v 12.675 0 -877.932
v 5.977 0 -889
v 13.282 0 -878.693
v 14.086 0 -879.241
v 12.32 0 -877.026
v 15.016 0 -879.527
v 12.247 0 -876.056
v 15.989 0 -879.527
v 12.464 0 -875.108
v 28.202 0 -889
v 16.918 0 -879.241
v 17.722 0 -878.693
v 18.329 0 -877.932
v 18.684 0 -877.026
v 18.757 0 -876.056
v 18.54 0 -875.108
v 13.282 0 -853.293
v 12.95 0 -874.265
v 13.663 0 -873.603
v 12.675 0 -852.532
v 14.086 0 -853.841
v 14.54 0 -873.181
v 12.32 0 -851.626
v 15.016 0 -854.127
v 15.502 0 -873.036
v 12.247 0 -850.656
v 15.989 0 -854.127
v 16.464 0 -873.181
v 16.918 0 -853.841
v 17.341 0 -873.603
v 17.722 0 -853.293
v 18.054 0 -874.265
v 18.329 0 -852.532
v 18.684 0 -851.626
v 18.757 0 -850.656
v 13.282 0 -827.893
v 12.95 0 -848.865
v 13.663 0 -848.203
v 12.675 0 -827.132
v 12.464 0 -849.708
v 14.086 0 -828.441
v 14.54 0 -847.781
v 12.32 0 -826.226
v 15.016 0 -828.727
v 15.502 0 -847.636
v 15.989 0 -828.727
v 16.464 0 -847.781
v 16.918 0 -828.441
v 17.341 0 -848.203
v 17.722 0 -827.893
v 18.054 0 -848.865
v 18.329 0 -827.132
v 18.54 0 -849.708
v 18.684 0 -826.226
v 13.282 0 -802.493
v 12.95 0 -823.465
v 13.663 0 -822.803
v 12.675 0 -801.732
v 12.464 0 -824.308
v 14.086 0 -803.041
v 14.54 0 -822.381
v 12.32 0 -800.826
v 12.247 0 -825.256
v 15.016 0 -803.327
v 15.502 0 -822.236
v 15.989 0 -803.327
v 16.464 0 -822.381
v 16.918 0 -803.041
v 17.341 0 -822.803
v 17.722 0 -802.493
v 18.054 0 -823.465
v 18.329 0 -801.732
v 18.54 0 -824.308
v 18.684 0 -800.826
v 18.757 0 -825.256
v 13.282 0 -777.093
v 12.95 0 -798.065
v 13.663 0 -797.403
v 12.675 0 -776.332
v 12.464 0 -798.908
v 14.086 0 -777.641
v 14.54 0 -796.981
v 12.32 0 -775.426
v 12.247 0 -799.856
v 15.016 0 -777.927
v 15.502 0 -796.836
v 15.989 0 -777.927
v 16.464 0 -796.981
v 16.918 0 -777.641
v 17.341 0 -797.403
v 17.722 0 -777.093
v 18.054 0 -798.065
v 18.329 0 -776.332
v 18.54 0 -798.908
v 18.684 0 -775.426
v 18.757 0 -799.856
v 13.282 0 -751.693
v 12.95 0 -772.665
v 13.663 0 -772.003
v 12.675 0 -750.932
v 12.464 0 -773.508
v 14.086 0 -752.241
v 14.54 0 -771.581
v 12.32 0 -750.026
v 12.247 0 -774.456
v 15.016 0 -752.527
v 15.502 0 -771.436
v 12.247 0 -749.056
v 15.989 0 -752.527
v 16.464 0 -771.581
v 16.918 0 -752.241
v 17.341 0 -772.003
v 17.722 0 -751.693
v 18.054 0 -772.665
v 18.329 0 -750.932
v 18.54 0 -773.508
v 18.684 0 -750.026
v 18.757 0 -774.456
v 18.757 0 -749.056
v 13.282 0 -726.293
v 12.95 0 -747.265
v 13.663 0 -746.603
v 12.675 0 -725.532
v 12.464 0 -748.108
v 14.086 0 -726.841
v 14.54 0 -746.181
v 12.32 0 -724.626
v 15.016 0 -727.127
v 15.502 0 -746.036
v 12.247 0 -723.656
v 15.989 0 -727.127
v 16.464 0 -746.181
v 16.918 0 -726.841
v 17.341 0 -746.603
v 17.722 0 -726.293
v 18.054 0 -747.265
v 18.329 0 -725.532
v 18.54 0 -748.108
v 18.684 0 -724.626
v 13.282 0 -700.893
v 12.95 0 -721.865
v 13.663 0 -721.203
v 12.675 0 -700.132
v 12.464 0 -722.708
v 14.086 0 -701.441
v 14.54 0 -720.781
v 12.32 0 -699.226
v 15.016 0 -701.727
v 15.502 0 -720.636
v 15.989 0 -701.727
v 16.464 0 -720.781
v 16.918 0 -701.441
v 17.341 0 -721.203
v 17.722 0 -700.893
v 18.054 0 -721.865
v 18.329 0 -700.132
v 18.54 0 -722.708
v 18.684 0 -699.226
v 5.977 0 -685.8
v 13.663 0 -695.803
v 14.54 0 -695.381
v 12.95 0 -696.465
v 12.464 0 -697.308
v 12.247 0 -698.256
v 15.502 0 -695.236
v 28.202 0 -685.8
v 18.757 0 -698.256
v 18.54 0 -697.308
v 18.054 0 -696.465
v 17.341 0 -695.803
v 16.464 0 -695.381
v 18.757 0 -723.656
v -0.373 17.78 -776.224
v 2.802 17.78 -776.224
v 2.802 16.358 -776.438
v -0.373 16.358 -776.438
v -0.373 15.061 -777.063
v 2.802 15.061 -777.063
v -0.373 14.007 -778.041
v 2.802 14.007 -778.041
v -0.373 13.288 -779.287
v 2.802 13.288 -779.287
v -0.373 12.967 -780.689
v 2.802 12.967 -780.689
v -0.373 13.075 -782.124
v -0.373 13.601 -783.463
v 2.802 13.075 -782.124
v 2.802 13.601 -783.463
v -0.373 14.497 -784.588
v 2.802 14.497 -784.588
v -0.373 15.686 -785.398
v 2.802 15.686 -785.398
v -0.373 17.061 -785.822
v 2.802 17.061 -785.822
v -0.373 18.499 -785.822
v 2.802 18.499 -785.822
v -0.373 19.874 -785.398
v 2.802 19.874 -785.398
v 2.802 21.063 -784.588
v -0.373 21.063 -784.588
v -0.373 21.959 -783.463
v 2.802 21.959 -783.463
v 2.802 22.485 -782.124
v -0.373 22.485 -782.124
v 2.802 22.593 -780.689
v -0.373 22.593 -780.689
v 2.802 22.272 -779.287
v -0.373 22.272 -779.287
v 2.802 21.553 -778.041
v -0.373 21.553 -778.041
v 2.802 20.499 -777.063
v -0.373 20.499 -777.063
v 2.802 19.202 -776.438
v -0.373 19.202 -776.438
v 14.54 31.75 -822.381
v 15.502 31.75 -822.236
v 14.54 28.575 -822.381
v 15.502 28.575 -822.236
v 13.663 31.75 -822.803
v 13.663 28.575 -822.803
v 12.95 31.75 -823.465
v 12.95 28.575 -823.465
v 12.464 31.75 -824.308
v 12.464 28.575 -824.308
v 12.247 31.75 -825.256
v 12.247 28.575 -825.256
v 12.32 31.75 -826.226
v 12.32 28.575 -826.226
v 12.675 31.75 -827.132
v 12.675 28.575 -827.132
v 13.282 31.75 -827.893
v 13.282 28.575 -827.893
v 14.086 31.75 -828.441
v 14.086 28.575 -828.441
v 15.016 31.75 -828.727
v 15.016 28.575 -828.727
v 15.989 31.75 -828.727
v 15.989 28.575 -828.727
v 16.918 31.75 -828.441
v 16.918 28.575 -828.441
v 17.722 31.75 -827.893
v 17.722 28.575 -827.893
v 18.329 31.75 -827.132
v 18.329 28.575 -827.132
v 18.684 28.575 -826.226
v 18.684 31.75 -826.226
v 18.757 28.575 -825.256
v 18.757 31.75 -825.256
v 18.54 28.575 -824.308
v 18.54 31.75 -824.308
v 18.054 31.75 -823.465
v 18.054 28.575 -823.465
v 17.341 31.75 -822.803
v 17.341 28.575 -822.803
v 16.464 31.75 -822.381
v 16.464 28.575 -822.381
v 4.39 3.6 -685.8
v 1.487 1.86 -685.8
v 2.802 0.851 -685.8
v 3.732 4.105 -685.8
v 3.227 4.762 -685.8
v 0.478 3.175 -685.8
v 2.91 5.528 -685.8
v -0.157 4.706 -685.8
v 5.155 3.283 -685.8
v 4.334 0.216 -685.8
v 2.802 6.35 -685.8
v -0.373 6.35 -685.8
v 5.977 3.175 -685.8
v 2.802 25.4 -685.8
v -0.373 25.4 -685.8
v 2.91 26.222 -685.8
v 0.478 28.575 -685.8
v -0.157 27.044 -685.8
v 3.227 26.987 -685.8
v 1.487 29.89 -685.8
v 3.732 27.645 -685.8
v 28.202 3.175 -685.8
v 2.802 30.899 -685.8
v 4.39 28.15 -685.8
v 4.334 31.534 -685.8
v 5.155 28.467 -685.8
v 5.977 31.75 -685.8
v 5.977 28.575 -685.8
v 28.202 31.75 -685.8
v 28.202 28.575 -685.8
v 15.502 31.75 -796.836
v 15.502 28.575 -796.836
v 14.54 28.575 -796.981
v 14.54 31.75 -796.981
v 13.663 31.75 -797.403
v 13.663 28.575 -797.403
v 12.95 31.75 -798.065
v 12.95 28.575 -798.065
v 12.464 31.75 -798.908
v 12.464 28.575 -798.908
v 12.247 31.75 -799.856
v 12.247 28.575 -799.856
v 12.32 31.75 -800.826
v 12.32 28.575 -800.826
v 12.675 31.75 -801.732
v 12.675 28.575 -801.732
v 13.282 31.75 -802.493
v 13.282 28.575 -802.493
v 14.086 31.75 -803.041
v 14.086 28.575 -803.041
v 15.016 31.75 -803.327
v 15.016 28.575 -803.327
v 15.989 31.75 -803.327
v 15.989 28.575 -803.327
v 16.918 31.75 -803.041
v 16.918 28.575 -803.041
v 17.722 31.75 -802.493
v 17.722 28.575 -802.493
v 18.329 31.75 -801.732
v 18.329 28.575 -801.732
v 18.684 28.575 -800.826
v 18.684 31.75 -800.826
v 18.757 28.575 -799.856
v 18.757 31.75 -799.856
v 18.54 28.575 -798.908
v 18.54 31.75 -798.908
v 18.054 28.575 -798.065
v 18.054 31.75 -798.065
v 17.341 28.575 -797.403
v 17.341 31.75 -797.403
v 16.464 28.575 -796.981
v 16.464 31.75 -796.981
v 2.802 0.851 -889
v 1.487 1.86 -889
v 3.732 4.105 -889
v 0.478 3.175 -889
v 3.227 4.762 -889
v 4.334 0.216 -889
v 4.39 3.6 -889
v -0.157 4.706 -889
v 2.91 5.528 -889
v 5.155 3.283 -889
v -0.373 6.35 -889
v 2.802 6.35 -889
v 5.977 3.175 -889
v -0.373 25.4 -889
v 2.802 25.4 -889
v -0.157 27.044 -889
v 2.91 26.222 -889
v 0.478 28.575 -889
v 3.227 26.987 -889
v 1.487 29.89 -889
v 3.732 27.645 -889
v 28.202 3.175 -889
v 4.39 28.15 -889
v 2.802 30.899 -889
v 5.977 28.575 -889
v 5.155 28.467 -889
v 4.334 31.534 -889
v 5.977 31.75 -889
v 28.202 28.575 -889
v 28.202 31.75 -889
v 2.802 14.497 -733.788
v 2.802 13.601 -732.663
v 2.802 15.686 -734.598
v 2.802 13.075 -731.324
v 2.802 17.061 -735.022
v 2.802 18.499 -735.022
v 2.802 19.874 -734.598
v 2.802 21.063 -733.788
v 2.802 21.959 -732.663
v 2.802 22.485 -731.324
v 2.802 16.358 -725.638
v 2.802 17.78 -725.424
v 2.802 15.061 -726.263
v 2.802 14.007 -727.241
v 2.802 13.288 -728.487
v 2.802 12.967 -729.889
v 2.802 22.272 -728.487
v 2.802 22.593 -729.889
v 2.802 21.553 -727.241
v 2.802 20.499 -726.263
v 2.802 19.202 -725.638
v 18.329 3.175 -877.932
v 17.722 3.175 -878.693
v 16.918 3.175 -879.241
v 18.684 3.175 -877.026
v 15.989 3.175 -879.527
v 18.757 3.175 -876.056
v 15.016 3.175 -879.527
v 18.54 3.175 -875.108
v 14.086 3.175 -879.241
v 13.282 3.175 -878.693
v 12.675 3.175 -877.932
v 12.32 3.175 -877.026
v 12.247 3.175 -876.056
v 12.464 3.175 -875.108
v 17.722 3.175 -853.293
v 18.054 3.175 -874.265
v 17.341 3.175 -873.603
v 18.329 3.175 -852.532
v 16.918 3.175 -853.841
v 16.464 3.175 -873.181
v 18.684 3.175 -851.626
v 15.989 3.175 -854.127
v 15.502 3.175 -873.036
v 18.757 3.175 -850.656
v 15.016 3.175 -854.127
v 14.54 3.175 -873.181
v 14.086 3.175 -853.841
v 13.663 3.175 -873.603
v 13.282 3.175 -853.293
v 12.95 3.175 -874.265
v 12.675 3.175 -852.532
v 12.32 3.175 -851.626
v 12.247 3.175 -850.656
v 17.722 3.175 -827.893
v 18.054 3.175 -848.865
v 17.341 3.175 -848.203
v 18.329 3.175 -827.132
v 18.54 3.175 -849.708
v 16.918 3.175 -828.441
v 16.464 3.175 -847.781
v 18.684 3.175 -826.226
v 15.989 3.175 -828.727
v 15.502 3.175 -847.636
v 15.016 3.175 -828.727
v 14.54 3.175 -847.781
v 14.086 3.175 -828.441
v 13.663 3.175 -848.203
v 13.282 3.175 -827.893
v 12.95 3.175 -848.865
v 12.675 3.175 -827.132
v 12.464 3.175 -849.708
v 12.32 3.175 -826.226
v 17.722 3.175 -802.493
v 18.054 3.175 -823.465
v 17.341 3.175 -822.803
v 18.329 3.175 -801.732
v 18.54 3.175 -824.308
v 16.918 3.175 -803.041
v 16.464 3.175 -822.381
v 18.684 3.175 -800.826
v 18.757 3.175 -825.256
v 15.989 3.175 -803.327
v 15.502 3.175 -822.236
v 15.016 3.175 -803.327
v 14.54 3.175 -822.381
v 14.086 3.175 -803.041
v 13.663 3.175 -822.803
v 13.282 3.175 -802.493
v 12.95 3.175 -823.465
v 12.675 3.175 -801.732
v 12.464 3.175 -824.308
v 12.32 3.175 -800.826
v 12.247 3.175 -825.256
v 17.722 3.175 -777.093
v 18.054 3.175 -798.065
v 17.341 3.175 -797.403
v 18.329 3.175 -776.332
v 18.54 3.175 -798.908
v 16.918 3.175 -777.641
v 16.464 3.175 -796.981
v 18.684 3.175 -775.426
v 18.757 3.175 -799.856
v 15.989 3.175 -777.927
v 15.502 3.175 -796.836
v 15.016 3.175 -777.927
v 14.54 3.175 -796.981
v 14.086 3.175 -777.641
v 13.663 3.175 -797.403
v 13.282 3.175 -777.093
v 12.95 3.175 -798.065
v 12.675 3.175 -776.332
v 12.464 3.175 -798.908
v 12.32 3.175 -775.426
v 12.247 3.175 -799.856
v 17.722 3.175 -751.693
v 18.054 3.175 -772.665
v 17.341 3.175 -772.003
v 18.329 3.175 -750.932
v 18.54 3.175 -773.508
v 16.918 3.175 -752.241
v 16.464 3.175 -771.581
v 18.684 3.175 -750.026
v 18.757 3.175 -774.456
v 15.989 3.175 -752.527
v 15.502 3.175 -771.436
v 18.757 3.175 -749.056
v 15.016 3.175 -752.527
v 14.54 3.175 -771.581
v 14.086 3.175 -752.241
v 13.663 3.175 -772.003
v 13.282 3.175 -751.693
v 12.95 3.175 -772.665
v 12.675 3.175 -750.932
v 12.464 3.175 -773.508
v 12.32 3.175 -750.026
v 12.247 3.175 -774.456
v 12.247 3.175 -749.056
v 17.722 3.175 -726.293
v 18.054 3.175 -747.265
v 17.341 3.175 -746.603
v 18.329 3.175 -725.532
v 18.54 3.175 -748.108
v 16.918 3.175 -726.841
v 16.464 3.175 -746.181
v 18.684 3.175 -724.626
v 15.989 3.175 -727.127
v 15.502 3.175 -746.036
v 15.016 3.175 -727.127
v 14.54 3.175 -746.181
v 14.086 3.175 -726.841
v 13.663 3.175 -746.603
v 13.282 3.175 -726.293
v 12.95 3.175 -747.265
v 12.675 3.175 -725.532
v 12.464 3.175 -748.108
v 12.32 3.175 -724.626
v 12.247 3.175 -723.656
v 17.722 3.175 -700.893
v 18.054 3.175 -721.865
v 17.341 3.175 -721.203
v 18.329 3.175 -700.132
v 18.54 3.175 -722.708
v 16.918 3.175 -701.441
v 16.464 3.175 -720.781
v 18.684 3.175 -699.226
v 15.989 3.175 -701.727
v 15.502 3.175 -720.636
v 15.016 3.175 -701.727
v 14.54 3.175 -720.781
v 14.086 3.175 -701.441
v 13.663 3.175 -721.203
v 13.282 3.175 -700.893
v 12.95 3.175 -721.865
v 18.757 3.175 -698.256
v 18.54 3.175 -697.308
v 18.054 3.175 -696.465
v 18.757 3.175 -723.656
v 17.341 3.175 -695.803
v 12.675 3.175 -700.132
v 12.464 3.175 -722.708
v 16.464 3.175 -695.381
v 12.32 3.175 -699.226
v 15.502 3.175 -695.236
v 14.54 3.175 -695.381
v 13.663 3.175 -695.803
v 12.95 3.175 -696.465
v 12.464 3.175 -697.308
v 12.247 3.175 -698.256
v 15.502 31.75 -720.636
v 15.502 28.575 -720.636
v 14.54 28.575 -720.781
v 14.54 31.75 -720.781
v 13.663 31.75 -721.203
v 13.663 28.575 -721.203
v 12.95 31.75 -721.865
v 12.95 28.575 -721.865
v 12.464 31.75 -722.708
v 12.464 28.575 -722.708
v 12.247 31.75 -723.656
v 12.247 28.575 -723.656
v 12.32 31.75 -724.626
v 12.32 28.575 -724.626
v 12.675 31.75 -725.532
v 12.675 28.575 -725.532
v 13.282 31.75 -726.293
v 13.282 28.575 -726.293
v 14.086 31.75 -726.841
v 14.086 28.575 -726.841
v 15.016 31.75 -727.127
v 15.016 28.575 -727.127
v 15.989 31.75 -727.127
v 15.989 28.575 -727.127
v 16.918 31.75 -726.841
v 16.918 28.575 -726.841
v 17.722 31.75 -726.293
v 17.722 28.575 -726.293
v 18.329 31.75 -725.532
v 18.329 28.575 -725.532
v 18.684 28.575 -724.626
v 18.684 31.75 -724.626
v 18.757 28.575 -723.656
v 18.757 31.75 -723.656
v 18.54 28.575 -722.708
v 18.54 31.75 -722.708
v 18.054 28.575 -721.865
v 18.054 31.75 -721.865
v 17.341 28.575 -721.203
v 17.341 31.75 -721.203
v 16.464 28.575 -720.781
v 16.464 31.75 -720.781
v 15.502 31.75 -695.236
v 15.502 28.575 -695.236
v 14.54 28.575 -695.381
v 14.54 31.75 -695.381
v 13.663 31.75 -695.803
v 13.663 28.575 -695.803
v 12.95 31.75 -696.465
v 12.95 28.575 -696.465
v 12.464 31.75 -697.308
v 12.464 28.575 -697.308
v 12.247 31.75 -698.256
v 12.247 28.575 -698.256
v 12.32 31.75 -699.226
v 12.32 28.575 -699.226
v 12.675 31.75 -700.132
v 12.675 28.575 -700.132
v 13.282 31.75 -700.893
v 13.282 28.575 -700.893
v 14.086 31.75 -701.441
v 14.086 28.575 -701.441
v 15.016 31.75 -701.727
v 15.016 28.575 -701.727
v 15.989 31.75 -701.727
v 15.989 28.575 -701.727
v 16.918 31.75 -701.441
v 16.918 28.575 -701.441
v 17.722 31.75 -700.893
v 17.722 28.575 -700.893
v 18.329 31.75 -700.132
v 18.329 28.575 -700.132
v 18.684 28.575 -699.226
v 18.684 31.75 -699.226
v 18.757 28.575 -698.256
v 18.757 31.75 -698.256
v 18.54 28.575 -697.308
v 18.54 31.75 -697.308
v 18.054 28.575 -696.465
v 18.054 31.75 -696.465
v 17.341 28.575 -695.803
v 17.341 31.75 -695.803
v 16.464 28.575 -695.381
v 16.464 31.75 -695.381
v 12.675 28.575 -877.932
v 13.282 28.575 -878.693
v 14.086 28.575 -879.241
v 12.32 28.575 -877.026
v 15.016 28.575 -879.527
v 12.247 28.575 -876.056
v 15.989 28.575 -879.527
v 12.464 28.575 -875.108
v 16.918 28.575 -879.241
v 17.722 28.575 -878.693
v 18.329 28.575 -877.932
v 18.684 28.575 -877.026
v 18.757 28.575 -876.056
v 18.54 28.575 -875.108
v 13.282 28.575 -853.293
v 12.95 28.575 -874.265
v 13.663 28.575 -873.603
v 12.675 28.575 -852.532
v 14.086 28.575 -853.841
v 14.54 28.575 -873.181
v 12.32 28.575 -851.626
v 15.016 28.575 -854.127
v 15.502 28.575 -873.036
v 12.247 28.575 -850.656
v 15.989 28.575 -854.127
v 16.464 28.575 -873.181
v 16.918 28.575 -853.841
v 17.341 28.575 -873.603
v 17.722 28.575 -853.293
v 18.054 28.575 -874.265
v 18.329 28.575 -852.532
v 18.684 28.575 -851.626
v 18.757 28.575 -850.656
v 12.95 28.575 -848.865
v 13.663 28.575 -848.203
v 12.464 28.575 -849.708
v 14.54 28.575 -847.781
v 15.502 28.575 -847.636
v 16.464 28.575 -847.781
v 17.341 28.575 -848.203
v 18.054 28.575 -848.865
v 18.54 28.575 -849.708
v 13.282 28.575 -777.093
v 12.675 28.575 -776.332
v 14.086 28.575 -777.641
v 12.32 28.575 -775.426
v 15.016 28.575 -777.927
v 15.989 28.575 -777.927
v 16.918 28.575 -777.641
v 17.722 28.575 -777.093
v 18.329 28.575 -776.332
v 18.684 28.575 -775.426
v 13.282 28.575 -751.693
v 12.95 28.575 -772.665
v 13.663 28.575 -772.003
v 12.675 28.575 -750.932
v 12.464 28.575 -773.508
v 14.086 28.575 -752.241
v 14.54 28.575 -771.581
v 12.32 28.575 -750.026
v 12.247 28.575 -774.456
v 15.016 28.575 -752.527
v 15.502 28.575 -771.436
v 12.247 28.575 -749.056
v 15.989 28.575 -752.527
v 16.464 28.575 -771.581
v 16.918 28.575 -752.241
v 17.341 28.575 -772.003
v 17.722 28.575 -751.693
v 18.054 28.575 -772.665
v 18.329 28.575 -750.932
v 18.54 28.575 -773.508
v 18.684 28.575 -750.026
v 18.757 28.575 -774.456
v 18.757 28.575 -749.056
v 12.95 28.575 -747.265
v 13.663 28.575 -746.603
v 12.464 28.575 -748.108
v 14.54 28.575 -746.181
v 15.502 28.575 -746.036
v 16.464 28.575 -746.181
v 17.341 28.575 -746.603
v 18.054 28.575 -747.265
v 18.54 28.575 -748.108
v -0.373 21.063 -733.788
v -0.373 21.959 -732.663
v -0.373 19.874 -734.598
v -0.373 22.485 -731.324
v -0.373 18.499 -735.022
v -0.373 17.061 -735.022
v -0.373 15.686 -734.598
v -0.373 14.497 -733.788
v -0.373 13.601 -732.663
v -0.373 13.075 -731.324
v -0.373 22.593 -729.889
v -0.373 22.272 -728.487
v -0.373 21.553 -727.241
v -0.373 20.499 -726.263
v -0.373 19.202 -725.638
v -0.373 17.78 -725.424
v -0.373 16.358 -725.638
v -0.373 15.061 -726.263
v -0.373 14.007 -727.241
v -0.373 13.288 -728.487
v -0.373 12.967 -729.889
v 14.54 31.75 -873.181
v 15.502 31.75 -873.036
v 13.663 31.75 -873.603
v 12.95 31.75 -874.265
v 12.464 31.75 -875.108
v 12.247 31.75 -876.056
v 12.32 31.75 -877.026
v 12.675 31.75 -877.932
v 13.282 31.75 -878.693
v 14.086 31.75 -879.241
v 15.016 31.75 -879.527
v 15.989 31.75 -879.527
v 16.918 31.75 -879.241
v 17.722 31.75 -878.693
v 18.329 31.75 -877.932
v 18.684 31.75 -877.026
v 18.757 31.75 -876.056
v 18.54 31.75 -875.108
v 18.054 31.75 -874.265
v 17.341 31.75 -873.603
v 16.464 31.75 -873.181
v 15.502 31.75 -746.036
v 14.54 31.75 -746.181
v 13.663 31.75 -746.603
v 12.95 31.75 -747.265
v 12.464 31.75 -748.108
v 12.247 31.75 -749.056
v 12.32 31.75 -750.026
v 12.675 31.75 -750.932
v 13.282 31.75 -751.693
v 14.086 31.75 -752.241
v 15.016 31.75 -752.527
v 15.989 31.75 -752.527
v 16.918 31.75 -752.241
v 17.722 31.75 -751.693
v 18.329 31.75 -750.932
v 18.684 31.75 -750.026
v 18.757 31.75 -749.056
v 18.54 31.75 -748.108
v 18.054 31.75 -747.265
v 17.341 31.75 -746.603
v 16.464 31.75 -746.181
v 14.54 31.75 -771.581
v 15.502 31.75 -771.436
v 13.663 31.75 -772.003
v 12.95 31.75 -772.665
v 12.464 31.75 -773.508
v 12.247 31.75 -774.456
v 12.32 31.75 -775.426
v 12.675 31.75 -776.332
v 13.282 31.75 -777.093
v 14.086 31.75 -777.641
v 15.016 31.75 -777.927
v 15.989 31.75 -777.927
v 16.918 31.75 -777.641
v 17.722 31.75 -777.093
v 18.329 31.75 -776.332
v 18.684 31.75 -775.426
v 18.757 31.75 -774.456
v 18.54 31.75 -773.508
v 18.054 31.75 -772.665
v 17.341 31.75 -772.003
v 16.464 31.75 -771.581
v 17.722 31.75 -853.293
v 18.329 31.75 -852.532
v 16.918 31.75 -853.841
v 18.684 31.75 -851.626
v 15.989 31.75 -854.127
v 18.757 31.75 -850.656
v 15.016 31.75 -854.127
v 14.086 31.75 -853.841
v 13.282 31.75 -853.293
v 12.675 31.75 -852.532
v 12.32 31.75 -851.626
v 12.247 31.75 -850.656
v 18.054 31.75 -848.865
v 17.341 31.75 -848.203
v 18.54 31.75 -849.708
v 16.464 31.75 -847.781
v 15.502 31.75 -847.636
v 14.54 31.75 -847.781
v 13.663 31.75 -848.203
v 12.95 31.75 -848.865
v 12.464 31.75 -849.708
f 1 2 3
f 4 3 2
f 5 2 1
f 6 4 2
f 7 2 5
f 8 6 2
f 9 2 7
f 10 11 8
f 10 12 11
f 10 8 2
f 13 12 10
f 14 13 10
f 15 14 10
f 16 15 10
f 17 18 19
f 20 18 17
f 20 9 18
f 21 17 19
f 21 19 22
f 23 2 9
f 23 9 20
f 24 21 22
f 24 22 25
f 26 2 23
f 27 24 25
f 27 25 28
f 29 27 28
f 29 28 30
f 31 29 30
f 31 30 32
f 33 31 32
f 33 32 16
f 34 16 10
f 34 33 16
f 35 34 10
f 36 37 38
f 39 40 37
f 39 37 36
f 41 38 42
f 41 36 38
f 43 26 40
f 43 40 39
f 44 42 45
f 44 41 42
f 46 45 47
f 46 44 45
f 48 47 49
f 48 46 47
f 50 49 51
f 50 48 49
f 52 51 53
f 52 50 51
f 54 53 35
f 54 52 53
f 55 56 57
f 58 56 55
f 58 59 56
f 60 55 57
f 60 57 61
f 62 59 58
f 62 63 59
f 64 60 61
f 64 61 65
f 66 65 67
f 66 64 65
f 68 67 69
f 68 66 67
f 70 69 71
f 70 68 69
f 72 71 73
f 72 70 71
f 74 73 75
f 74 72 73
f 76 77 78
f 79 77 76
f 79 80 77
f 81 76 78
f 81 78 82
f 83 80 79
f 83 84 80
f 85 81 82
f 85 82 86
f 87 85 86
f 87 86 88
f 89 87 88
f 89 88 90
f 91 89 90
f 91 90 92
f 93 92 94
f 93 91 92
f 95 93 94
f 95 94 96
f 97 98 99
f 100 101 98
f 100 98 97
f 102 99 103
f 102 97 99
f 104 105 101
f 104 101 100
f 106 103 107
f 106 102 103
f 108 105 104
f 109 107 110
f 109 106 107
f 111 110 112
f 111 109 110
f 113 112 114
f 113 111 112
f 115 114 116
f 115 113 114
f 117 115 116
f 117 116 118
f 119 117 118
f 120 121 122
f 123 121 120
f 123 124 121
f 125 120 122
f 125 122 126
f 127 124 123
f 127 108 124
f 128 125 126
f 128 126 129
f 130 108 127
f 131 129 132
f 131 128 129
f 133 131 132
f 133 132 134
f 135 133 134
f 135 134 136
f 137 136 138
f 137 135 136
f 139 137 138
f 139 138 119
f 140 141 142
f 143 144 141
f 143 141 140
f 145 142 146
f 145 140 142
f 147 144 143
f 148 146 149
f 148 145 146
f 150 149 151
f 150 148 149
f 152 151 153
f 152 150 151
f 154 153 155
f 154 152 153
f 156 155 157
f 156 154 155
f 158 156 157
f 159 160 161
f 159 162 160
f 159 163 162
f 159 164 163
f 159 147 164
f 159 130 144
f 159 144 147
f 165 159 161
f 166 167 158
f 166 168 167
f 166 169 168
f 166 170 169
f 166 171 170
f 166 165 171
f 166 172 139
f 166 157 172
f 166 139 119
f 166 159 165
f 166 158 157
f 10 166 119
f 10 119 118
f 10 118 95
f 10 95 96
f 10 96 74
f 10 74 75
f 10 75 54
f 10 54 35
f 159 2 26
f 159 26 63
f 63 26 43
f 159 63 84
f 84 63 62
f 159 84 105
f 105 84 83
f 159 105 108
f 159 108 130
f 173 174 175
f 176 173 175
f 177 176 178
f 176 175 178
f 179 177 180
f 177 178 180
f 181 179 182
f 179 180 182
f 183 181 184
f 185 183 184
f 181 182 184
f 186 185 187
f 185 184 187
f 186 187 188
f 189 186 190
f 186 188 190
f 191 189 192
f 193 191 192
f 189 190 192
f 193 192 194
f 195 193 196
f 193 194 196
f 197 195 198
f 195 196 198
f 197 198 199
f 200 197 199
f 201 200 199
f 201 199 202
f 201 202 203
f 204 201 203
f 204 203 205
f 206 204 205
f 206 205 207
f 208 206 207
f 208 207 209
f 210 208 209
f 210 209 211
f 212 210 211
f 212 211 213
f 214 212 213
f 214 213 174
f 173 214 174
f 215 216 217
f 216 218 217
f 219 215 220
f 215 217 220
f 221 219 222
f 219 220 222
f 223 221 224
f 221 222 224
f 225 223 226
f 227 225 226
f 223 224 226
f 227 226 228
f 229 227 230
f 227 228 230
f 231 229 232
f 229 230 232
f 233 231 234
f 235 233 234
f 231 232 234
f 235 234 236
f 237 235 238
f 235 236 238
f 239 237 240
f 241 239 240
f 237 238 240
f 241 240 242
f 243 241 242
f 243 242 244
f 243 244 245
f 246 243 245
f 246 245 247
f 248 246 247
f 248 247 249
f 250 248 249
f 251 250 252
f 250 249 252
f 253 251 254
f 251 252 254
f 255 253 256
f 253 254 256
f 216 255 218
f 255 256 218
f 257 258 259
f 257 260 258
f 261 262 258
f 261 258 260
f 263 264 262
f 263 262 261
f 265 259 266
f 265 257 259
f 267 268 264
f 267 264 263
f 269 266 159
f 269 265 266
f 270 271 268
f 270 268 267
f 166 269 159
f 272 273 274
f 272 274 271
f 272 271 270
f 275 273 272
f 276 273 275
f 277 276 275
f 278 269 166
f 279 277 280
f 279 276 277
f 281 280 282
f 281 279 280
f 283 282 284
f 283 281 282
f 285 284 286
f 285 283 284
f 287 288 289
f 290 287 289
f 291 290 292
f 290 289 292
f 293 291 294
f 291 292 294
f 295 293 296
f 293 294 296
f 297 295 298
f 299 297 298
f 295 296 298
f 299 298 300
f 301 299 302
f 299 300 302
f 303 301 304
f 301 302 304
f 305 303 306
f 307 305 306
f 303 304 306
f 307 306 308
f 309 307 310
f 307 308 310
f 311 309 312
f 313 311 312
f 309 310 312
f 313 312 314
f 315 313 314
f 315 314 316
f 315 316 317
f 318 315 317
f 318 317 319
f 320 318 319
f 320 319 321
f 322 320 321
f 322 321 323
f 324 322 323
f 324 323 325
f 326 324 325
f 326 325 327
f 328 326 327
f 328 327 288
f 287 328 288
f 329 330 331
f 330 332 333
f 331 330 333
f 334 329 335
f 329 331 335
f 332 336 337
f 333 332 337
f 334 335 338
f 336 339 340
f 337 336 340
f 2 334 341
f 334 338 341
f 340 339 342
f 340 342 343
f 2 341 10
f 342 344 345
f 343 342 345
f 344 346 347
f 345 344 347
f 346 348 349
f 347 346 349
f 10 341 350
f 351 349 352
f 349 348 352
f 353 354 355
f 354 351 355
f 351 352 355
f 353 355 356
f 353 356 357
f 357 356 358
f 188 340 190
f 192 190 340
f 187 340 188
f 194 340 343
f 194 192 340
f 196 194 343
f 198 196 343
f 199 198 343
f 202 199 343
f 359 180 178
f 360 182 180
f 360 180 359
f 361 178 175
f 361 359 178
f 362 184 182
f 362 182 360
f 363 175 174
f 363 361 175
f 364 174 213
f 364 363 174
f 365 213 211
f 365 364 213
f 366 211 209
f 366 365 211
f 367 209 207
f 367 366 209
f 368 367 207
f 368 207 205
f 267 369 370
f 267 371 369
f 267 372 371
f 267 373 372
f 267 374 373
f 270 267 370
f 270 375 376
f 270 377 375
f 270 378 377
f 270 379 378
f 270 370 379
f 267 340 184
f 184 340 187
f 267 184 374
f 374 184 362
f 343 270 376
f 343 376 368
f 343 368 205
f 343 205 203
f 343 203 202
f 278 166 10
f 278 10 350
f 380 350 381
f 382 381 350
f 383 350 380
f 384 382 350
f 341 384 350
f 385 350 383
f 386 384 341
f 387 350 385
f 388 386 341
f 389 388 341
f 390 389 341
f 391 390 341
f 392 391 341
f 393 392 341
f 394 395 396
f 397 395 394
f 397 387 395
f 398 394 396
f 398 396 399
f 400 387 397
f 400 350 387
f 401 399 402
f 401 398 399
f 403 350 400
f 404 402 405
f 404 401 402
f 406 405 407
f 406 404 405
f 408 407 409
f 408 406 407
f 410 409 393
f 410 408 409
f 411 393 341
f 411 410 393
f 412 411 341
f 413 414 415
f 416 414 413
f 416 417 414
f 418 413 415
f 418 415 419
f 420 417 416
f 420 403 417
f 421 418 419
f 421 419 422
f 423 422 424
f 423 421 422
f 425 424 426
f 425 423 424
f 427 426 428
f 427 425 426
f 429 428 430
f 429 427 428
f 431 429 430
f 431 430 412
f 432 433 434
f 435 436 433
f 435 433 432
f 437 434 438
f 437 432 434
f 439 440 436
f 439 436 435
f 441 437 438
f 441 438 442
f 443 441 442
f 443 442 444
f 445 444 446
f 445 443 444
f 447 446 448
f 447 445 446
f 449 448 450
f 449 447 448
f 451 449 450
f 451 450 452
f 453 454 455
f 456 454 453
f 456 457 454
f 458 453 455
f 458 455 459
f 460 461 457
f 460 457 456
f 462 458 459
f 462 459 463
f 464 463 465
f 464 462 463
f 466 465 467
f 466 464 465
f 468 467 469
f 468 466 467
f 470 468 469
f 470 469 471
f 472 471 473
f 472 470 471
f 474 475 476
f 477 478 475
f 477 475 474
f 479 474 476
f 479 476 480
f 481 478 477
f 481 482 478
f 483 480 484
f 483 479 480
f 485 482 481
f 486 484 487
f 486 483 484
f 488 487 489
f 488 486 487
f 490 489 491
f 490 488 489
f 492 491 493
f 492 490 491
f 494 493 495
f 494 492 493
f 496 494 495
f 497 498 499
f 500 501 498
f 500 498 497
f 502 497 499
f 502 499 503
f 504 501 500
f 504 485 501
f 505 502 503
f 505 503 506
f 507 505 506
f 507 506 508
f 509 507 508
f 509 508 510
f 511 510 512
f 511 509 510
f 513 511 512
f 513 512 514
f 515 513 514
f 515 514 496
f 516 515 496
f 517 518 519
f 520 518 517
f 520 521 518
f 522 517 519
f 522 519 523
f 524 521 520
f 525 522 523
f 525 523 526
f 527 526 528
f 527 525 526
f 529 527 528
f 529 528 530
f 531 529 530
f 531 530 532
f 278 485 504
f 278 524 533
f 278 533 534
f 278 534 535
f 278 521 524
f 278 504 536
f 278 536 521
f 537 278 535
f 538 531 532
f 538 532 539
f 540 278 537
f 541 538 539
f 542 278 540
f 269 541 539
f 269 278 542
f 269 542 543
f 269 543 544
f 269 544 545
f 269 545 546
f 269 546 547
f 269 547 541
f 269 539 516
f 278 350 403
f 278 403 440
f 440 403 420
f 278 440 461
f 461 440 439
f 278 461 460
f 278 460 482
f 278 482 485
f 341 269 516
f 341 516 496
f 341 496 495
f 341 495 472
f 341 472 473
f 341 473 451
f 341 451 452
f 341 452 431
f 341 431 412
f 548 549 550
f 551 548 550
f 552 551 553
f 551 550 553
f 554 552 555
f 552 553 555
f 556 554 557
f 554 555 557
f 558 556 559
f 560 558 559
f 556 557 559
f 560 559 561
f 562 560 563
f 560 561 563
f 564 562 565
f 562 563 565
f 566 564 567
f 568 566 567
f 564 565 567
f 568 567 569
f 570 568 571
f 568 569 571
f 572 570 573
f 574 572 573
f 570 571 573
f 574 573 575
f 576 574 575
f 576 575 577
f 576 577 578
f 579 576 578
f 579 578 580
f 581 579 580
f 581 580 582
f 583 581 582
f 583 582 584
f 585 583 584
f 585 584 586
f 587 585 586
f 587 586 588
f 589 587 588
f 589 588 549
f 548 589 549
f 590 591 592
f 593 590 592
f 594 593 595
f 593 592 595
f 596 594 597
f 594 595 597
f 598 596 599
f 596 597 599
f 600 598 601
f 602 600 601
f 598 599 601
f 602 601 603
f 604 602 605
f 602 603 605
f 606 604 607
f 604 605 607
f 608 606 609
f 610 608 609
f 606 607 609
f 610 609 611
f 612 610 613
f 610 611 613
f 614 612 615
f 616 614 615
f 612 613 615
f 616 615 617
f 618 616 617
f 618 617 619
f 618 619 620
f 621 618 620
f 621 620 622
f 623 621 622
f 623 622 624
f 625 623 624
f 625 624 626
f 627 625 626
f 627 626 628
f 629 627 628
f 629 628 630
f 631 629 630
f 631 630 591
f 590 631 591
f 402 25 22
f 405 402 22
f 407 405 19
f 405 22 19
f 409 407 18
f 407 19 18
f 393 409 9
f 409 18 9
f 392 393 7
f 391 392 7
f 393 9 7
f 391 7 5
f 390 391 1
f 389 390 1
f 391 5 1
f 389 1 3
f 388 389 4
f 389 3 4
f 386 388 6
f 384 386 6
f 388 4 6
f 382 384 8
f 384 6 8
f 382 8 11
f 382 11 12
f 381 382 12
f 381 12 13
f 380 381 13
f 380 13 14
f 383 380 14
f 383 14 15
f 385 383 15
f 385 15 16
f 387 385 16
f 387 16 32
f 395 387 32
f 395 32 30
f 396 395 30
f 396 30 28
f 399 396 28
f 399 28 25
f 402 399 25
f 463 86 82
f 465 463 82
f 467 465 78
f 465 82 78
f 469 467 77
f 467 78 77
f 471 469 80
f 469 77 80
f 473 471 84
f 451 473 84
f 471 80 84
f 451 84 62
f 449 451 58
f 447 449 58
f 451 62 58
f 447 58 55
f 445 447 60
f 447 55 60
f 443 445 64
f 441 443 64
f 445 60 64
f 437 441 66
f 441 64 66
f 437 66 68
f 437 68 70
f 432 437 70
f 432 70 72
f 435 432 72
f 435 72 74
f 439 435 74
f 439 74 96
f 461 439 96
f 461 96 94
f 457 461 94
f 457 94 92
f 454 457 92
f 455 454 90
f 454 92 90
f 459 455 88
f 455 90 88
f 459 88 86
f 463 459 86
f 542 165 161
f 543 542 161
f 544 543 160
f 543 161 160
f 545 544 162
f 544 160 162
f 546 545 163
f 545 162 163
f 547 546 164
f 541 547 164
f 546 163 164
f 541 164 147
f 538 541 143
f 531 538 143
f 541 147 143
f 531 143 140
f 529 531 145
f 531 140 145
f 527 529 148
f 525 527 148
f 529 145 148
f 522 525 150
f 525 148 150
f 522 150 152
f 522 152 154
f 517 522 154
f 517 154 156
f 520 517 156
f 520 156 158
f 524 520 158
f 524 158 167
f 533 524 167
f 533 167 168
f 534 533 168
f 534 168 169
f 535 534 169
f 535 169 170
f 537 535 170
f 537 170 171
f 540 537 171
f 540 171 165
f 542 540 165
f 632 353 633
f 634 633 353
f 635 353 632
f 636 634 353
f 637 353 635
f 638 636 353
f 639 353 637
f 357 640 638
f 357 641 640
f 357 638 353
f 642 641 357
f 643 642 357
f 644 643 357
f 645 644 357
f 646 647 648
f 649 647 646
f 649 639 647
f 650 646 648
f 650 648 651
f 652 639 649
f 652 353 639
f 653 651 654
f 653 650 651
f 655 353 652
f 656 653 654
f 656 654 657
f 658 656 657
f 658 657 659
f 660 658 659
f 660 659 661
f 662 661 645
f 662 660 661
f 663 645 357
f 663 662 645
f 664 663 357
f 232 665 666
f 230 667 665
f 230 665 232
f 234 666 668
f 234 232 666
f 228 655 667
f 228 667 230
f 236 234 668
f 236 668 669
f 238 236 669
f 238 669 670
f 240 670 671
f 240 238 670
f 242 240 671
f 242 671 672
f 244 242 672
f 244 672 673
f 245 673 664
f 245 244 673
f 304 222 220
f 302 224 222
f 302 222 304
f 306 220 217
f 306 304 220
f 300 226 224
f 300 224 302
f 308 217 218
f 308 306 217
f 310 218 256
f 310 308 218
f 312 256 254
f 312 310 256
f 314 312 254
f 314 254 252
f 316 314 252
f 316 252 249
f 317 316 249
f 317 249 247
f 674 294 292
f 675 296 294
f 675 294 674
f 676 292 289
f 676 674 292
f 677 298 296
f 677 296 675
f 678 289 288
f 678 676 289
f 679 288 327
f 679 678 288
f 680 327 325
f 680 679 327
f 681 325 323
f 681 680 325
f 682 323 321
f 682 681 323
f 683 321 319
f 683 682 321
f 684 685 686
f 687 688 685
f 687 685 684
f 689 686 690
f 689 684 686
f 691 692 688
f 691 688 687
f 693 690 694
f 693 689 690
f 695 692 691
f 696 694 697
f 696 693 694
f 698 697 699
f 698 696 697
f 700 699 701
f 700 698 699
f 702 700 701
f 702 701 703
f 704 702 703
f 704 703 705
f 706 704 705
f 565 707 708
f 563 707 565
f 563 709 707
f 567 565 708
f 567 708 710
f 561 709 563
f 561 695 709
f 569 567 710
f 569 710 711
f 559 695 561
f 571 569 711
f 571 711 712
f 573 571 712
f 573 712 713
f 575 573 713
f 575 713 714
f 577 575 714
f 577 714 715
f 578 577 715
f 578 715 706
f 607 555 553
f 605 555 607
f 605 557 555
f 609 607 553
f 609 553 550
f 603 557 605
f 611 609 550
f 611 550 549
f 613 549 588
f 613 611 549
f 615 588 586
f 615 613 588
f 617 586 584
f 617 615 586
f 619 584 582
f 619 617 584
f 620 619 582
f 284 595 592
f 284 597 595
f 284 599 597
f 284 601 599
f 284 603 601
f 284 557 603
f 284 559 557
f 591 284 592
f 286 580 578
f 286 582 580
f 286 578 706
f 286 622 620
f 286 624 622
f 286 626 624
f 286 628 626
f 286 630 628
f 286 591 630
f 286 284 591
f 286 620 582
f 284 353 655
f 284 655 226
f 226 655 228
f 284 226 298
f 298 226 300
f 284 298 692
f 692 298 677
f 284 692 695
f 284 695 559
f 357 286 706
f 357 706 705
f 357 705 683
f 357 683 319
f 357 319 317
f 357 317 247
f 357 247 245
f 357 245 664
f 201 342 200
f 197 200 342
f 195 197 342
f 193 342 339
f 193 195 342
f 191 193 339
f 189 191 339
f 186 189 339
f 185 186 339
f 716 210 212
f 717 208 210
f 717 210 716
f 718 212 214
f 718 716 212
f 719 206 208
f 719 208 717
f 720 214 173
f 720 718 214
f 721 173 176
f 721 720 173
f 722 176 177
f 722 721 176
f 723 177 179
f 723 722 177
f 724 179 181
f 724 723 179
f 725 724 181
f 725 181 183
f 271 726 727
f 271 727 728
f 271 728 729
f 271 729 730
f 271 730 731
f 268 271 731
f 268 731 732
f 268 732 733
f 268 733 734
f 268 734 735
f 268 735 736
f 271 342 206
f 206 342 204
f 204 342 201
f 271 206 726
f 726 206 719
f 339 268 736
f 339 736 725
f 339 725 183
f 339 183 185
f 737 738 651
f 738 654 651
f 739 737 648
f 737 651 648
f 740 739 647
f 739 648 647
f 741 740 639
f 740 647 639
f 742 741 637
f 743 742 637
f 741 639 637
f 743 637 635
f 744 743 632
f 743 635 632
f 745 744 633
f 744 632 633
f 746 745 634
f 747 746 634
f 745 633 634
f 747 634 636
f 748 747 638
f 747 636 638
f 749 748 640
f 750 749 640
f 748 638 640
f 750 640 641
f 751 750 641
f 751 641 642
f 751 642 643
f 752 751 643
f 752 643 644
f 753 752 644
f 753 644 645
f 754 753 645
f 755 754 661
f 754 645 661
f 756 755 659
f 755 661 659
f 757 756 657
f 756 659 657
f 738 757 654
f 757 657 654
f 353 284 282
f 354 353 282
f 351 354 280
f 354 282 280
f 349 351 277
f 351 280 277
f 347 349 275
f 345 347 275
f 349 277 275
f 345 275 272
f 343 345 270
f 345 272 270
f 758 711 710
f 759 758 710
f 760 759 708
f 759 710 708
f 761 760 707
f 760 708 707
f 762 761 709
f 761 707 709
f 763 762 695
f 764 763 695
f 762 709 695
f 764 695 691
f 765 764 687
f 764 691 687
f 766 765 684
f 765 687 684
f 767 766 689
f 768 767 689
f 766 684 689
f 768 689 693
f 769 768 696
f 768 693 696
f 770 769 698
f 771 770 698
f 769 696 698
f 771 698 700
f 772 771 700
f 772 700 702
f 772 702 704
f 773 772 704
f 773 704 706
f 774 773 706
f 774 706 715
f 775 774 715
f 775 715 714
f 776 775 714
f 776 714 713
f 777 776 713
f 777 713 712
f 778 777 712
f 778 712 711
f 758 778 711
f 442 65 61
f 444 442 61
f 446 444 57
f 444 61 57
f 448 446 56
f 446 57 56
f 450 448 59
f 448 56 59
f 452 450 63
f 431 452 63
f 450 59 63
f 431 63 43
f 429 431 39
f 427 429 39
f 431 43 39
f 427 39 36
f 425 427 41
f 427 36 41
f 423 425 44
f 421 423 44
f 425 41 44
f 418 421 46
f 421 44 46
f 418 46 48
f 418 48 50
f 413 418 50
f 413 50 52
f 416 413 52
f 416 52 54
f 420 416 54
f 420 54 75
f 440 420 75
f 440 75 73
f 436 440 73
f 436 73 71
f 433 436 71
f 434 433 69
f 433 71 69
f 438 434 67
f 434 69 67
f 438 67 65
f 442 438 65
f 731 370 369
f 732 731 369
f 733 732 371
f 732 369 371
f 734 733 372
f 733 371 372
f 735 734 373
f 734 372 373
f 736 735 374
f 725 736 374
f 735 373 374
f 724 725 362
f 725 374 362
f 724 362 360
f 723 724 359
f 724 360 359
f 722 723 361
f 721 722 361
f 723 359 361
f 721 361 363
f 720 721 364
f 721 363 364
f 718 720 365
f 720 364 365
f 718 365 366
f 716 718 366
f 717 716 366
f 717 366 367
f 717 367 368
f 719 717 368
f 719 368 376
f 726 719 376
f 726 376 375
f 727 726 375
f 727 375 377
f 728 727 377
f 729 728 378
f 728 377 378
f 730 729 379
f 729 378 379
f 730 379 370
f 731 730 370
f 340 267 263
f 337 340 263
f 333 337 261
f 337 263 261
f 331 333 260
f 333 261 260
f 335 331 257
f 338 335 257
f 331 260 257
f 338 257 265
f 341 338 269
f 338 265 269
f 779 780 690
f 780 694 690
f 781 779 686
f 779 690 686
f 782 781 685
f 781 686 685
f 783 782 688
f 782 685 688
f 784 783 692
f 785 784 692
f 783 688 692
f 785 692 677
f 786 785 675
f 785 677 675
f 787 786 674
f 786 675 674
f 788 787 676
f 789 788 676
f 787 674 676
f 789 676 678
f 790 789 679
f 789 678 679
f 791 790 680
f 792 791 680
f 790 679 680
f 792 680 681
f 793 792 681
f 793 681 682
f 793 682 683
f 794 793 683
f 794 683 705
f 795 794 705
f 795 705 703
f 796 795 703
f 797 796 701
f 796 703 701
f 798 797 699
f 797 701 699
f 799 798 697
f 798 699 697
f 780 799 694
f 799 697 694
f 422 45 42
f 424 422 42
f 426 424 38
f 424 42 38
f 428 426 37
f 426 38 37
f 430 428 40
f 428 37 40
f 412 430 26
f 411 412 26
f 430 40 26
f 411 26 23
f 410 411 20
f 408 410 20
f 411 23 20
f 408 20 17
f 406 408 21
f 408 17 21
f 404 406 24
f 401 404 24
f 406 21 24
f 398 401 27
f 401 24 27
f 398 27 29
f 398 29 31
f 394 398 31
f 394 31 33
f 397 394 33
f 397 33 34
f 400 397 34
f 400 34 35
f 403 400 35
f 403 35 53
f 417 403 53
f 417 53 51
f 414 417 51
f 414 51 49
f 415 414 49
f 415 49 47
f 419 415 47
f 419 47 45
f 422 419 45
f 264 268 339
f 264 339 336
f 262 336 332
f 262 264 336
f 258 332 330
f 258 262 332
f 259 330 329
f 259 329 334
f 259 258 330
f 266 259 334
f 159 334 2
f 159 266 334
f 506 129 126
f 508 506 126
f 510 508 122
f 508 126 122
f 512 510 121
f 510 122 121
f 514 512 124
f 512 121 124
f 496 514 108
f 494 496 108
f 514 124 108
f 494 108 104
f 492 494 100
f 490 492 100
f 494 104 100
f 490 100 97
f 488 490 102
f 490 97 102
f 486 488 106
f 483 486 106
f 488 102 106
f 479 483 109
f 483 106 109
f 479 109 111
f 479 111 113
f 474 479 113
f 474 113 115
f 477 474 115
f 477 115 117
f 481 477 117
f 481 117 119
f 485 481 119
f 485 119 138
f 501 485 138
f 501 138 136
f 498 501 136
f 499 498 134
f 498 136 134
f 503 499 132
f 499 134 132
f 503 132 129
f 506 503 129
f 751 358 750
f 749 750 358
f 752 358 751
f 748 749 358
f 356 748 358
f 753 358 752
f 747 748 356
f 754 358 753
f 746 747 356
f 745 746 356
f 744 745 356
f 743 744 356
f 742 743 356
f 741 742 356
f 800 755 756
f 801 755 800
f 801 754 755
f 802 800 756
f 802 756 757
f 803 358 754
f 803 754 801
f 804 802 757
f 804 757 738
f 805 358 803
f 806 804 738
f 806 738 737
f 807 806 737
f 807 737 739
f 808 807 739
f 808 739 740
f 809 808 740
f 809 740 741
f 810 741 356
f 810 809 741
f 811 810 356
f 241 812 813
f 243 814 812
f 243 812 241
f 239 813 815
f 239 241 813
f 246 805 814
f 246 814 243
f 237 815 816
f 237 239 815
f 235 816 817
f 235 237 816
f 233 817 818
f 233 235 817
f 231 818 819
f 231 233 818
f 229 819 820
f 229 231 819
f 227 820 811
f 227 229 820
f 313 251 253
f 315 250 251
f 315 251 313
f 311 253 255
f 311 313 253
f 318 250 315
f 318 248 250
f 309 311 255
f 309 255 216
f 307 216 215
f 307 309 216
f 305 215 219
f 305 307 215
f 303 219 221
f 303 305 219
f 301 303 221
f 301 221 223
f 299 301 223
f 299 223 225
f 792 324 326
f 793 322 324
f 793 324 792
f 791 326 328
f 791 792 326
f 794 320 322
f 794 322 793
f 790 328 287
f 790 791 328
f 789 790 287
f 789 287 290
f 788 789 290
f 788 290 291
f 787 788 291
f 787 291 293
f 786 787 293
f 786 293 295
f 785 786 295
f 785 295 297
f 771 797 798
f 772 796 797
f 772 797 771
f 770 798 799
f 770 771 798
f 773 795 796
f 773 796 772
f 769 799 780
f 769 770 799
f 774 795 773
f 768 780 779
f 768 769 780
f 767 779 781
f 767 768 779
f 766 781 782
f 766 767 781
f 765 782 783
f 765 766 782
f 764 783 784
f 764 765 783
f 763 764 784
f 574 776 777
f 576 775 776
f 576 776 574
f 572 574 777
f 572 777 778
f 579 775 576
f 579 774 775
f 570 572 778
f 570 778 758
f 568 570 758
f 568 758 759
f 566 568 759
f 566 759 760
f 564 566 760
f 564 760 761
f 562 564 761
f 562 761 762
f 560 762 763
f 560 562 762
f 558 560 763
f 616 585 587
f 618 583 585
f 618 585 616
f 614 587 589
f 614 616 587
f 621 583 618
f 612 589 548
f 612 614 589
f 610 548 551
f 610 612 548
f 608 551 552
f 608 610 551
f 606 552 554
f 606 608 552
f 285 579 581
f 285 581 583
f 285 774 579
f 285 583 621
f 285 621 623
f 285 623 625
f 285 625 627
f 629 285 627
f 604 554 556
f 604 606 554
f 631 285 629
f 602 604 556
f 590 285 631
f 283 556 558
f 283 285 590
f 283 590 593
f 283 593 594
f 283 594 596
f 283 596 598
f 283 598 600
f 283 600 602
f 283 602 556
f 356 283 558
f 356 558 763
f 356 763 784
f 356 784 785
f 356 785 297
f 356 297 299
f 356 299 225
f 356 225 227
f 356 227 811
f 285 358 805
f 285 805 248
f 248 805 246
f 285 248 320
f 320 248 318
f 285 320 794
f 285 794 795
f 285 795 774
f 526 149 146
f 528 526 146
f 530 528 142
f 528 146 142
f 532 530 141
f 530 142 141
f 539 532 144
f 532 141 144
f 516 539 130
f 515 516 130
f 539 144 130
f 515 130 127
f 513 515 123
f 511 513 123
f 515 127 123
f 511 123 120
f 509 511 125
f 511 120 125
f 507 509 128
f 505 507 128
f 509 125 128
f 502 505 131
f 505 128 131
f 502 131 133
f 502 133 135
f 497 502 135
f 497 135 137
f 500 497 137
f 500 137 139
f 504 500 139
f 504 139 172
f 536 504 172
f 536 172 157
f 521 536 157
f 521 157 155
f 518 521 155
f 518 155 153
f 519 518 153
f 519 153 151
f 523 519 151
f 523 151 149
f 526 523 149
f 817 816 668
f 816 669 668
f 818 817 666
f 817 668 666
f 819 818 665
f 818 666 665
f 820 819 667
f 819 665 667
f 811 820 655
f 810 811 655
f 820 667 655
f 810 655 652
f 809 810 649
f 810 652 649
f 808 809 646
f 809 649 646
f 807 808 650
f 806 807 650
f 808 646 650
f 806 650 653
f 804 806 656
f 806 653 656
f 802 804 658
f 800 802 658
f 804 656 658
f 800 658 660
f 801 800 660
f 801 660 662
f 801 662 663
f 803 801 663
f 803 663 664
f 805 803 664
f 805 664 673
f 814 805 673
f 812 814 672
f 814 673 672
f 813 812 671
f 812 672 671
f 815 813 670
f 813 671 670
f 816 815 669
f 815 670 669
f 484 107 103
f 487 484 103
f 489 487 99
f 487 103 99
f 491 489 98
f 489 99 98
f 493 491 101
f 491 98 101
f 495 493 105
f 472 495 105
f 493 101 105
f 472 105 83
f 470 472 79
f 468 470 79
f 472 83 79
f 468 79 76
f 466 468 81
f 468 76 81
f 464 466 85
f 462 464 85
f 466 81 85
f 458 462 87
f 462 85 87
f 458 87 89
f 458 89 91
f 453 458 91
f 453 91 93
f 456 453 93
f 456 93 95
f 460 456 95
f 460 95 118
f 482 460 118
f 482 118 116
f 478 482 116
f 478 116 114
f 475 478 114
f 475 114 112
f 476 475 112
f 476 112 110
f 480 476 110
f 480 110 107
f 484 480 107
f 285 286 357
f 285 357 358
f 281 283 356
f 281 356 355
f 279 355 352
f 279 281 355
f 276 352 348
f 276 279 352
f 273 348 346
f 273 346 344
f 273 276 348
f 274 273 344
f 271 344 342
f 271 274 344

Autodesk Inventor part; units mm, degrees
ref_plane "YZ Plane" through (0, 0, 0) normal (1, 0, 0) x (0, 1, 0)
ref_plane "XZ Plane" through (0, 0, 0) normal (0, 1, 0) x (-1, 0, 0)
ref_plane "XY Plane" through (0, 0, 0) normal (0, 0, 1) x (1, 0, 0)
sketch "Sketch1" plane through (0, 0, 0) normal (0, 0, 1) x (1, 0, 0)
  line L0 (5.9771, 0) -> (28.2021, 0)
  line L1 (28.2021, 0) -> (28.2021, 3.175)
  line L2 (28.2021, 3.175) -> (5.9771, 3.175)
  line L3 (2.8021, 6.35) -> (2.8021, 25.4)
  line L4 (5.9771, 28.575) -> (28.2021, 28.575)
  line L5 (28.2021, 28.575) -> (28.2021, 31.75)
  line L6 (28.2021, 31.75) -> (5.9771, 31.75)
  line L7 (-0.3729, 25.4) -> (-0.3729, 6.35)
  arc A0 (5.9771, 28.575) -> (2.8021, 25.4) centre (5.9771, 25.4) ccw
  arc A1 (2.8021, 6.35) -> (5.9771, 3.175) centre (5.9771, 6.35) ccw
  arc A2 (5.9771, 31.75) -> (-0.3729, 25.4) centre (5.9771, 25.4) ccw
  arc A3 (-0.3729, 6.35) -> (5.9771, 0) centre (5.9771, 6.35) ccw
  point P0 (0, 0)
  point P1 (-0.3729, 0)
  point P2 (2.8021, 3.175)
  point P3 (2.8021, 28.575)
  dimension "d0" = 28.575
  dimension "d1" = 3.175
  dimension "d2" = 25.4
  dimension "d3" = 25.4
  dimension "d4" = 3.175
  dimension "d5" = 3.175
  dimension "d6" = 6.35
extrude "Extrusion1" add sketch "Sketch1" against normal blind 889
sketch "Sketch2" plane through (-0.3729, 6.35, 0) normal (-1, 0, 0) x (0, 0, 1)
  line L0 (0, 19.05) -> (-889, 19.05) projected
  line L1 (-228.6, 0) -> (-228.6, 7.9375)
  arc A0 (-228.6, 11.1125) -> (-228.6, 7.9375) centre (-228.6, 9.525) ccw
  line L2 (-228.6, 11.1125) -> (-228.6, 19.05)
  line L3 (-228.6, 19.05) -> (-889, 19.05)
  line L4 (-889, 0) -> (-889, 19.05)
  line L5 (-889, 0) -> (-228.6, 0)
  circle A1 centre (-552.45, 11.43) radius 4.826
  circle A2 centre (-501.65, 11.43) radius 4.826
  circle A3 centre (-387.35, 11.43) radius 4.826
  circle A4 centre (-336.55, 11.43) radius 4.826
  circle A5 centre (-444.5, 7.62) radius 4.826
  circle A6 centre (-730.25, 11.43) radius 4.826
  circle A7 centre (-781.05, 11.43) radius 4.826
  line L6 (0, 25.4) -> (-889, 25.4) construction
  circle A8 centre (-133.35, 11.43) radius 4.826
  circle A9 centre (-82.55, 11.43) radius 4.826
  point P0 (0, -6.35)
  point P1 (-254, 0.852)
  dimension "d10" = 7.62
  dimension "d11" = 3.81
  dimension "d14" = 254
hole "Hole1" at (-0.3729, 17.78, -781.05) at (-0.3729, 17.78, -730.25) at (-0.3729, 17.78, -552.45) at (-0.3729, 17.78, -501.65) at (-0.3729, 13.97, -444.5) at (-0.3729, 17.78, -387.35) at (-0.3729, 17.78, -336.55) at (-0.3729, 17.78, -133.35) at (-0.3729, 17.78, -82.55) direction (1, 0, 0) diameter 9.652 end through all
hole "Hole2" at (-0.3729, 15.875, -228.6) direction (1, 0, 0) diameter 3.175 end through all
sketch "Sketch3" plane through (5.9771, 31.75, 0) normal (0, 1, 0) x (1, 0, 0)
  line L0 (22.225, 889) -> (0, 889) projected
  line L1 (22.225, 0) -> (22.225, 889) projected
  point P0 (-5.9771, 0)
  point P1 (9.525, 876.3)
  dimension "d34" = 12.7
  dimension "d35" = 12.7
hole "Hole3" at (15.5021, 31.75, -876.3) direction (0, -1, 0) diameter 6.5278 end through all
pattern_linear "Rectangular Pattern1" count 35 spacing 25.4 along (0, 0, 1) of "Hole3"
sketch "Sketch4" plane through (5.9771, 31.75, 0) normal (0, 1, 0) x (1, 0, 0)
  circle A0 centre (9.525, 12.7) radius 3.2639 projected
  circle A1 centre (9.525, 38.1) radius 3.2639 projected
  circle A2 centre (9.525, 63.5) radius 3.2639 projected
  circle A3 centre (9.525, 88.9) radius 3.2639 projected
  circle A4 centre (9.525, 114.3) radius 3.2639 projected
  circle A5 centre (9.525, 139.7) radius 3.2639 projected
  circle A6 centre (9.525, 165.1) radius 3.2639 projected
  circle A7 centre (9.525, 190.5) radius 3.2639 projected
  line L0 (22.225, 0) -> (-13.6032, 0)
  line L1 (-13.6032, 0) -> (-13.6032, 685.8)
  line L2 (-13.6032, 685.8) -> (22.225, 685.8)
  line L3 (22.225, 685.8) -> (22.225, 0)
  point P0 (-5.9771, 0)
  dimension "d46" = 685.8
extrude "Extrusion2" cut sketch "Sketch4" against normal blind 38.1
equation "\"d35\" = d34"
properties part number "chassis 9 inch"
